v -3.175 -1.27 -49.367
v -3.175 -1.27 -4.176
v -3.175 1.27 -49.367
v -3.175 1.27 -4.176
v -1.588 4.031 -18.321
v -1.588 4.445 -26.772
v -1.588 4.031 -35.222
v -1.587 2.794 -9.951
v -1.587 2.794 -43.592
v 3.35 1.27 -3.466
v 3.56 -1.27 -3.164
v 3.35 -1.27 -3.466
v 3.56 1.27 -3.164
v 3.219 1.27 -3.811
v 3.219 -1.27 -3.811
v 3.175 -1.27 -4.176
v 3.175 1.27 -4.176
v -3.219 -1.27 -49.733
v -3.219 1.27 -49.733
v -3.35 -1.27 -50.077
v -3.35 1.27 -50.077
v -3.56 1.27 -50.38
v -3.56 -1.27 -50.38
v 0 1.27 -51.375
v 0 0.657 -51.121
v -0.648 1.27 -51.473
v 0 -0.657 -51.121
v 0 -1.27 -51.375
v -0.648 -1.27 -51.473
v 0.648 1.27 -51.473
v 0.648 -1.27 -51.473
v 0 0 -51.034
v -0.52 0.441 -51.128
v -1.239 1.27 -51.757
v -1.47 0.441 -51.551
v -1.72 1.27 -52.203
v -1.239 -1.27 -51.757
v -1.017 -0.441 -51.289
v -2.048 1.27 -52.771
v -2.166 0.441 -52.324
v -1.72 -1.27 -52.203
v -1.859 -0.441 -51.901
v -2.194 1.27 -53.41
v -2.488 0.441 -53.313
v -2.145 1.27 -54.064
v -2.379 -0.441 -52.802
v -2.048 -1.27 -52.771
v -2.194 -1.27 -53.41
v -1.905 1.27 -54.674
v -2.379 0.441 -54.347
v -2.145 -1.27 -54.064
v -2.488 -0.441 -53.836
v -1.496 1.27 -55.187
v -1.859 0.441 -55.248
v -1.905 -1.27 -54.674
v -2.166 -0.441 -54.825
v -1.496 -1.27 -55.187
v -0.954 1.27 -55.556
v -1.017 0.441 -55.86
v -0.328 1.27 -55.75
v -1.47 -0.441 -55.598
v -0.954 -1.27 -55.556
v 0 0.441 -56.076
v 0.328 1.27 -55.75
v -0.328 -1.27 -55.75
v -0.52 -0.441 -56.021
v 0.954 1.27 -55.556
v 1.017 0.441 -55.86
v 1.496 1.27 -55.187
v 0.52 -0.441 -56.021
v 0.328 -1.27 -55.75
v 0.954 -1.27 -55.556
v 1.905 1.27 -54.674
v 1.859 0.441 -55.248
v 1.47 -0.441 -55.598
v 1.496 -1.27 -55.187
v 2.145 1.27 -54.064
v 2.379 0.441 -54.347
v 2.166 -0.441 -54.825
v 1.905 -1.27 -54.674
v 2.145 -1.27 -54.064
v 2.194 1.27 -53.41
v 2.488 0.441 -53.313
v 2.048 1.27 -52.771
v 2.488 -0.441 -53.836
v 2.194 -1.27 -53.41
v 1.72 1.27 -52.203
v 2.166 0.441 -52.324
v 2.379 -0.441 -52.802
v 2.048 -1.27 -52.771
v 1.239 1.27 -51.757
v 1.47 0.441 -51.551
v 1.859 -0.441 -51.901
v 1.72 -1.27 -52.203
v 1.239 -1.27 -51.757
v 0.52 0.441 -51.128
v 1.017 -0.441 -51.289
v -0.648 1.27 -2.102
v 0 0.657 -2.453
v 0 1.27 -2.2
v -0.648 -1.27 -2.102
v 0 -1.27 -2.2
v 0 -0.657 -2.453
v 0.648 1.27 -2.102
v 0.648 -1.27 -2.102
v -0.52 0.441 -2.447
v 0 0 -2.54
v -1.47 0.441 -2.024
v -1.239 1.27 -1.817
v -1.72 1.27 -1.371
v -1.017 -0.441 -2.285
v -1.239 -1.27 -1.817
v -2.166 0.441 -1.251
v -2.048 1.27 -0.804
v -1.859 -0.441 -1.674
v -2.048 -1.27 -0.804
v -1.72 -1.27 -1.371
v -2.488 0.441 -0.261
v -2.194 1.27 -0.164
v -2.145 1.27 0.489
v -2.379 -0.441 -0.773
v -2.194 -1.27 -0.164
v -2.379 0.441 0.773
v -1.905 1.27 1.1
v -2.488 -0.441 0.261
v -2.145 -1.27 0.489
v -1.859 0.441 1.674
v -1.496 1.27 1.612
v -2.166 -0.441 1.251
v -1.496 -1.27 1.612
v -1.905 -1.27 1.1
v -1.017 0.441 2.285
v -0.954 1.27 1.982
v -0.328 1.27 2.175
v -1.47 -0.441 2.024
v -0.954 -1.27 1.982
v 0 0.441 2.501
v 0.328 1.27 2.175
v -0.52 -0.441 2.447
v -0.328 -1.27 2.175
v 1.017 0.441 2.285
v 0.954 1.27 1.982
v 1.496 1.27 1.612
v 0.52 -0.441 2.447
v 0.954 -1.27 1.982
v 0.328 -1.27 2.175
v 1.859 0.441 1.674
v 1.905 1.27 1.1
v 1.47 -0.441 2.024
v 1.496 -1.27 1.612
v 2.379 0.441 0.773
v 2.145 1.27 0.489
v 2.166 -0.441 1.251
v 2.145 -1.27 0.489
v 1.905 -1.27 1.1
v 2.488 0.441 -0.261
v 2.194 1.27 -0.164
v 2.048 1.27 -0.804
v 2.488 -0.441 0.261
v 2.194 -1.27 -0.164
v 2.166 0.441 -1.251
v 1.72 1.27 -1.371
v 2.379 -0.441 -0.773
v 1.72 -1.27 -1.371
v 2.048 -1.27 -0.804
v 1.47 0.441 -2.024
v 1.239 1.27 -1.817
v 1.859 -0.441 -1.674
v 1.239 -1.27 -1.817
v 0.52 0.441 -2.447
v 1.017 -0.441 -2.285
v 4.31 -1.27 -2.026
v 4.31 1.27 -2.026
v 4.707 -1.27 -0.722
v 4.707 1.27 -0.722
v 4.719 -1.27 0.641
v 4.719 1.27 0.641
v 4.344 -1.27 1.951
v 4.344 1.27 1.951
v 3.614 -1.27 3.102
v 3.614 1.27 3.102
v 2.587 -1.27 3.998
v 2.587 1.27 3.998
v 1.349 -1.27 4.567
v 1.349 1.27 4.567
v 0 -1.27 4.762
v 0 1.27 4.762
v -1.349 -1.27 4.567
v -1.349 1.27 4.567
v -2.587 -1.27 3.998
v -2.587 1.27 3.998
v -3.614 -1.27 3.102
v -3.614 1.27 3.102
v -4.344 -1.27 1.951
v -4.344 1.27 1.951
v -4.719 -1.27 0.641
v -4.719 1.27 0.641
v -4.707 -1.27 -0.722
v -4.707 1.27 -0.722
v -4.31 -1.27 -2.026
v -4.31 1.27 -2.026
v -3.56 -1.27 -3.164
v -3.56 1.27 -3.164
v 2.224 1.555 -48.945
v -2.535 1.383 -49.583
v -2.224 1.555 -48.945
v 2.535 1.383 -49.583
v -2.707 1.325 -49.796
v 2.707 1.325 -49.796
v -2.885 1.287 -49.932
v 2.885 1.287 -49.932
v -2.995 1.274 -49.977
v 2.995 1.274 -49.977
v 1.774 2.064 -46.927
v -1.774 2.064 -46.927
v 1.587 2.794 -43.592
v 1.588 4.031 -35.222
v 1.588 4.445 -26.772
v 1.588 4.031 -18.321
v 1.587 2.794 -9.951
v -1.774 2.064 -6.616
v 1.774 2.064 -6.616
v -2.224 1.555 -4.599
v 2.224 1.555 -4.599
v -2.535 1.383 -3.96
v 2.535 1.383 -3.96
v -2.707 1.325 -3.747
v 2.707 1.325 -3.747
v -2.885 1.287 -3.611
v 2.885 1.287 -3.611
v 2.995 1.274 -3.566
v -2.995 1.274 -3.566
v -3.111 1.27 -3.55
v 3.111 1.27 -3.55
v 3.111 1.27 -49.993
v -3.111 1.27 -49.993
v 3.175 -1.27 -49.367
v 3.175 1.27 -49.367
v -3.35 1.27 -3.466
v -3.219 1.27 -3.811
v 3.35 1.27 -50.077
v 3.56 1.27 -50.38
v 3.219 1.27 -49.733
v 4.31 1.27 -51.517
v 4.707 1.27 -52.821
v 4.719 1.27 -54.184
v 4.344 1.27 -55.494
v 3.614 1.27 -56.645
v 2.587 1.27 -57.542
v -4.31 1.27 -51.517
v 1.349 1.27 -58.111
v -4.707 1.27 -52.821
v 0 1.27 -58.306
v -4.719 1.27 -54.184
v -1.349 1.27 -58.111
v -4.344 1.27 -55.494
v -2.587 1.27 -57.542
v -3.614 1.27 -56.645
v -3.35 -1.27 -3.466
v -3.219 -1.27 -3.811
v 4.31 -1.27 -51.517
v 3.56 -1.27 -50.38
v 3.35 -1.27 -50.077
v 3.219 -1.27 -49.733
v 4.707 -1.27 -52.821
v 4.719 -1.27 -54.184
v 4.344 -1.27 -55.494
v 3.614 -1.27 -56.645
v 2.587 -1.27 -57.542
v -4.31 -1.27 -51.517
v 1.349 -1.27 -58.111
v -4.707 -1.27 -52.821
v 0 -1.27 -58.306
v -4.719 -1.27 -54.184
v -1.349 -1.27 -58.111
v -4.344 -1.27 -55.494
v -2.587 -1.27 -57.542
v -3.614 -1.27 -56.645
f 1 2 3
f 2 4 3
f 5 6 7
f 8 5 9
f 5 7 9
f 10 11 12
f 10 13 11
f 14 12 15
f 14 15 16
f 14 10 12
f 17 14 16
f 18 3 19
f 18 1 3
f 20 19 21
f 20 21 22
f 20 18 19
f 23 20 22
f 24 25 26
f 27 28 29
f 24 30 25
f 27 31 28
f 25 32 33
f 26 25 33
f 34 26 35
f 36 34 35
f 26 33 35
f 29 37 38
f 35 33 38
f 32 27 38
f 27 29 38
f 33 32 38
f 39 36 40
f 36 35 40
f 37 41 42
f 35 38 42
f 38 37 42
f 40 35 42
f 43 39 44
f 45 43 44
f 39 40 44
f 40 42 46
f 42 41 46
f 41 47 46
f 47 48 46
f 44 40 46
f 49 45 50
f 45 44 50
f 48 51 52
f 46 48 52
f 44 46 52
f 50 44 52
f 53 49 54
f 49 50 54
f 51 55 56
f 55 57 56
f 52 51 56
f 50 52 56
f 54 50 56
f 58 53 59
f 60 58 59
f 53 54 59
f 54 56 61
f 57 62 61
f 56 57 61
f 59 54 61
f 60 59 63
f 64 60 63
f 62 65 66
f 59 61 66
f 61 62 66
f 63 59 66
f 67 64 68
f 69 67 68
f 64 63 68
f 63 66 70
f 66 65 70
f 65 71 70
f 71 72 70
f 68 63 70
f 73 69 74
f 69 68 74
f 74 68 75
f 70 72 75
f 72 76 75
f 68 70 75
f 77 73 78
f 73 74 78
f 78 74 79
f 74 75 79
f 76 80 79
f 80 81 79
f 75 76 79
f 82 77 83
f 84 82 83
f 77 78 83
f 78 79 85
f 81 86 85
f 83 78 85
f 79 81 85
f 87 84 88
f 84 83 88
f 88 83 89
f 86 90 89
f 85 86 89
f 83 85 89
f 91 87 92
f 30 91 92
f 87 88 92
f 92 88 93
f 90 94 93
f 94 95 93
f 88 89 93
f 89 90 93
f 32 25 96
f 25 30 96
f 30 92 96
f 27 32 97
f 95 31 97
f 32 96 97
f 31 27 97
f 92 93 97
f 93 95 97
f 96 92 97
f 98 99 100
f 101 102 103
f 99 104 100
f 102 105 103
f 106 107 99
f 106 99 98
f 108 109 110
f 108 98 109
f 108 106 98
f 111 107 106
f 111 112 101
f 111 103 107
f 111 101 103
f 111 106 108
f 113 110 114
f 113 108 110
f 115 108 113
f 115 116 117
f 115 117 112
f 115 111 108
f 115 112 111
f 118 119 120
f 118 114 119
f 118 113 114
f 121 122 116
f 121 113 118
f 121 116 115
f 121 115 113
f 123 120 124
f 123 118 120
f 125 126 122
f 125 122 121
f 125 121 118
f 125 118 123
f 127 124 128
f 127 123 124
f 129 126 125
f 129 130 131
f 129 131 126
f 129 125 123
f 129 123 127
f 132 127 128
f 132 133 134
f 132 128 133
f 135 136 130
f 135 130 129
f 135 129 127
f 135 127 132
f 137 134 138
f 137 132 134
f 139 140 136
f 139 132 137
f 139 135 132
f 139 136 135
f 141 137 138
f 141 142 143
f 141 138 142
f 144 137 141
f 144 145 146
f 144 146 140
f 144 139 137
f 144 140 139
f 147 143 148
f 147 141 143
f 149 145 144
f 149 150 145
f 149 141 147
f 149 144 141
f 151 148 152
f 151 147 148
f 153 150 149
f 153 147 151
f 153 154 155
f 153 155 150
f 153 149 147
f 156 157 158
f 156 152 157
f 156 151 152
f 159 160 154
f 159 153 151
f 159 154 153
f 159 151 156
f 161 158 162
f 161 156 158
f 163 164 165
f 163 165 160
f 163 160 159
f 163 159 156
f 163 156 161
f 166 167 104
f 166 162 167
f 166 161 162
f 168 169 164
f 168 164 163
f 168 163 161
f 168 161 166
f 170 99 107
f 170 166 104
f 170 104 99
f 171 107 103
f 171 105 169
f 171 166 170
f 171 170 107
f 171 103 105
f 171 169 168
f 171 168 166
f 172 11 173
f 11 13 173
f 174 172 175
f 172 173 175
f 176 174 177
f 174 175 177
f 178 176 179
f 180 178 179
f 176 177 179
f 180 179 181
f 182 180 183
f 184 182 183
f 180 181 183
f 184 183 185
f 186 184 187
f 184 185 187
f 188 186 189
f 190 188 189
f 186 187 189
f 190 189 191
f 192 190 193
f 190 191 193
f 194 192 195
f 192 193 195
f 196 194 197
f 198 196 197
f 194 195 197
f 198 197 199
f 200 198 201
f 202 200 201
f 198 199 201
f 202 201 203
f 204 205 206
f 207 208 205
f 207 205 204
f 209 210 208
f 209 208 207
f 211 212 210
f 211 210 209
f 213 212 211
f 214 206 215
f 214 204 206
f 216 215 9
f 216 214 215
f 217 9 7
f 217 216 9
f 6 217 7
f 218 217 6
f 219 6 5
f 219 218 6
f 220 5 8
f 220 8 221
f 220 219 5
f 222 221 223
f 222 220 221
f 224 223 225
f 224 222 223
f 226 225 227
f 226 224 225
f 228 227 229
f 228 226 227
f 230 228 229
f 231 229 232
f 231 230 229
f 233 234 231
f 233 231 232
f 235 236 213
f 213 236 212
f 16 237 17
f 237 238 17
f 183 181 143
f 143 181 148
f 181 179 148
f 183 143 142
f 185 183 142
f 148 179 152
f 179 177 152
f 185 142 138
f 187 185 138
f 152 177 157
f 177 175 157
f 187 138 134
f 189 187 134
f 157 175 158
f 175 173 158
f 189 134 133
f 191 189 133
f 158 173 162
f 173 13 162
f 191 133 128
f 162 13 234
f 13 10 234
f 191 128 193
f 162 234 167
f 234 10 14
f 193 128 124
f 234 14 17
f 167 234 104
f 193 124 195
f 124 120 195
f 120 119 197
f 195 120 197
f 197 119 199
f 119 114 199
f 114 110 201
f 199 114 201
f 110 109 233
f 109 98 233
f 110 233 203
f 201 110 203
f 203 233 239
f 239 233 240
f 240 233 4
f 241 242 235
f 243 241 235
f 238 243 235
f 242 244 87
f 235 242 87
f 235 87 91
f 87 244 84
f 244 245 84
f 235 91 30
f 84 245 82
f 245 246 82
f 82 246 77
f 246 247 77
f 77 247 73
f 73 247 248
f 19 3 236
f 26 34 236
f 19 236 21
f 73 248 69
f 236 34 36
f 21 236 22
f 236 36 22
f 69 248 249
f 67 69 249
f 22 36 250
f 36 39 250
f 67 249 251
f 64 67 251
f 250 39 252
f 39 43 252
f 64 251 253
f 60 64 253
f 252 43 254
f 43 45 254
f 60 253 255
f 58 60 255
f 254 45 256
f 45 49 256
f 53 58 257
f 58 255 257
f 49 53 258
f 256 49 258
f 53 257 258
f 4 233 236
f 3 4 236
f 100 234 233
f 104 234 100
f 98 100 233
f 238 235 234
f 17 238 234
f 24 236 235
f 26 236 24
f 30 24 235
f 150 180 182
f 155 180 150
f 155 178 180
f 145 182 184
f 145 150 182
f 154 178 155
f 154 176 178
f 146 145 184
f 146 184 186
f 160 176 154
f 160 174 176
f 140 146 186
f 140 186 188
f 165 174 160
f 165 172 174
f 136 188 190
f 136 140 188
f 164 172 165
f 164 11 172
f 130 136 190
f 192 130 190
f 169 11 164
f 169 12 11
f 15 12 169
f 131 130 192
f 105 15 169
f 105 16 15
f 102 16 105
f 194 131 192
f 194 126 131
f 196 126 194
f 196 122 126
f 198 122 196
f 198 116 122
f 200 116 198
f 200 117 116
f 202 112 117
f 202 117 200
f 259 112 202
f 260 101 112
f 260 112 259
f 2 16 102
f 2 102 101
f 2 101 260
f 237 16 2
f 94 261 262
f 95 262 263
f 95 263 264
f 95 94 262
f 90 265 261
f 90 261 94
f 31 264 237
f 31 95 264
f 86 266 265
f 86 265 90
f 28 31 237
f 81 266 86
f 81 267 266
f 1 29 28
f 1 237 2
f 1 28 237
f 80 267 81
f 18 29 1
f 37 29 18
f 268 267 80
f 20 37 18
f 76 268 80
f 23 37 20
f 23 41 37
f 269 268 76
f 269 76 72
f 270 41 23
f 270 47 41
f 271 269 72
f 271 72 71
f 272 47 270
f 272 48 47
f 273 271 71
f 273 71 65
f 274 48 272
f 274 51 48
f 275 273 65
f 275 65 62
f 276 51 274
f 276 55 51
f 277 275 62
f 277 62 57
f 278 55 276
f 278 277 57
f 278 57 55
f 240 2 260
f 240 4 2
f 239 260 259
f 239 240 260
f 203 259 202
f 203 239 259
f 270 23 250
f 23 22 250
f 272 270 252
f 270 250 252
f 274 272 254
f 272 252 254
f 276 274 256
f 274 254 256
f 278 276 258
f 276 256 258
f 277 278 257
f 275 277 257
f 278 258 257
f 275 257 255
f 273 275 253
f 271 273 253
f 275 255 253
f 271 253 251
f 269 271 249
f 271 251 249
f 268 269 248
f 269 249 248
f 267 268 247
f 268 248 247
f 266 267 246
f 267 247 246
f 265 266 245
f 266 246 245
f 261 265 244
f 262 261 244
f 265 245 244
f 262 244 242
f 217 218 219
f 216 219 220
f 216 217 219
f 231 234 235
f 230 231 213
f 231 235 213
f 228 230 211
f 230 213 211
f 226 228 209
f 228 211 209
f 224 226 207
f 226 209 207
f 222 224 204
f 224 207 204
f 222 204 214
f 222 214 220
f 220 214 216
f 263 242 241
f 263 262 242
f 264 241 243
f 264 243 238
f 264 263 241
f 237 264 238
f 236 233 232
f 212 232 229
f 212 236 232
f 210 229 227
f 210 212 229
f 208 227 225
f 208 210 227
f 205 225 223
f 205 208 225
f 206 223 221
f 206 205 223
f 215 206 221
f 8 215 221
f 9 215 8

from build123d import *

# Parameters (mm, degrees)
SKETCH1_R           = 1.5875
BOSS_EXTRUDE1_DEPTH = 1.27
BOSS_EXTRUDE2_DEPTH = 1.5875
FILLET1_R           = 1.524


with BuildPart() as part:
    # Sketch1 → Boss-Extrude1 (new body, symmetric)
    with BuildSketch(Plane(origin=(0, 0, 0), x_dir=(1, 0, 0), z_dir=(0, 1, 0))):
        with BuildLine():
            Line((-3.175, 3.549757914), (-3.175, 49.993442086))
            ThreePointArc((-3.175, 49.993442086), (0, 58.3057), (3.175, 49.993442086))
            Line((3.175, 49.993442086), (3.175, 3.549757914))
            ThreePointArc((3.175, 3.549757914), (0, -4.7625), (-3.175, 3.549757914))
        make_face()
        Circle(SKETCH1_R, mode=Mode.SUBTRACT)
        with Locations((0, 53.5432)):
            Circle(SKETCH1_R, mode=Mode.SUBTRACT)
    extrude(amount=BOSS_EXTRUDE1_DEPTH, both=True)

    # Sketch2 → Cut-Revolve1 (revolve, cut)
    with BuildSketch(Plane(origin=(0, 0, 0), x_dir=(0, 0, -1), z_dir=(1, 0, 0))):
        with BuildLine():
            Line((0, -2.54), (0, 2.54))
            ThreePointArc((0, 2.54), (2.54, 0), (0, -2.54))
        make_face()
    revolve(axis=Axis((0, -2.54, 0), (0, 1, 0)), mode=Mode.SUBTRACT)

    # Sketch3 → Cut-Revolve2 (revolve, cut)
    with BuildSketch(Plane(origin=(0, 0, 0), x_dir=(0, 0, -1), z_dir=(1, 0, 0))):
        with BuildLine():
            Line((53.574492193, -2.54), (53.574492193, 2.54))
            ThreePointArc((53.574492193, 2.54), (51.034492193, 0), (53.574492193, -2.54))
        make_face()
    revolve(axis=Axis((0, 8.508702539, -53.574492193), (0, -1, 0)), mode=Mode.SUBTRACT)

    # Sketch5 → Boss-Extrude2 (add, symmetric)
    with BuildSketch(Plane(origin=(0, 0, 0), x_dir=(0, 0, -1), z_dir=(1, 0, 0))):
        with BuildLine():
            Line((3.549757914, 1.27), (49.993442086, 1.27))
            ThreePointArc((49.993442086, 1.27), (26.7716, 4.445), (3.549757914, 1.27))
        make_face()
    extrude(amount=BOSS_EXTRUDE2_DEPTH, both=True)

    # Fillet1
    fillet1_edges = [part.edges().sort_by_distance(p)[0] for p in [
        (-1.5875, 1.27, -26.7716),
        (1.5875, 1.27, -26.7716),
        (-3.175, 0, -3.549757914),
        (-3.175, 0, -49.993442086),
        (3.175, 0, -49.993442086),
        (3.175, 0, -3.549757914),
    ]]
    fillet(fillet1_edges, radius=FILLET1_R)


solid = part.part
